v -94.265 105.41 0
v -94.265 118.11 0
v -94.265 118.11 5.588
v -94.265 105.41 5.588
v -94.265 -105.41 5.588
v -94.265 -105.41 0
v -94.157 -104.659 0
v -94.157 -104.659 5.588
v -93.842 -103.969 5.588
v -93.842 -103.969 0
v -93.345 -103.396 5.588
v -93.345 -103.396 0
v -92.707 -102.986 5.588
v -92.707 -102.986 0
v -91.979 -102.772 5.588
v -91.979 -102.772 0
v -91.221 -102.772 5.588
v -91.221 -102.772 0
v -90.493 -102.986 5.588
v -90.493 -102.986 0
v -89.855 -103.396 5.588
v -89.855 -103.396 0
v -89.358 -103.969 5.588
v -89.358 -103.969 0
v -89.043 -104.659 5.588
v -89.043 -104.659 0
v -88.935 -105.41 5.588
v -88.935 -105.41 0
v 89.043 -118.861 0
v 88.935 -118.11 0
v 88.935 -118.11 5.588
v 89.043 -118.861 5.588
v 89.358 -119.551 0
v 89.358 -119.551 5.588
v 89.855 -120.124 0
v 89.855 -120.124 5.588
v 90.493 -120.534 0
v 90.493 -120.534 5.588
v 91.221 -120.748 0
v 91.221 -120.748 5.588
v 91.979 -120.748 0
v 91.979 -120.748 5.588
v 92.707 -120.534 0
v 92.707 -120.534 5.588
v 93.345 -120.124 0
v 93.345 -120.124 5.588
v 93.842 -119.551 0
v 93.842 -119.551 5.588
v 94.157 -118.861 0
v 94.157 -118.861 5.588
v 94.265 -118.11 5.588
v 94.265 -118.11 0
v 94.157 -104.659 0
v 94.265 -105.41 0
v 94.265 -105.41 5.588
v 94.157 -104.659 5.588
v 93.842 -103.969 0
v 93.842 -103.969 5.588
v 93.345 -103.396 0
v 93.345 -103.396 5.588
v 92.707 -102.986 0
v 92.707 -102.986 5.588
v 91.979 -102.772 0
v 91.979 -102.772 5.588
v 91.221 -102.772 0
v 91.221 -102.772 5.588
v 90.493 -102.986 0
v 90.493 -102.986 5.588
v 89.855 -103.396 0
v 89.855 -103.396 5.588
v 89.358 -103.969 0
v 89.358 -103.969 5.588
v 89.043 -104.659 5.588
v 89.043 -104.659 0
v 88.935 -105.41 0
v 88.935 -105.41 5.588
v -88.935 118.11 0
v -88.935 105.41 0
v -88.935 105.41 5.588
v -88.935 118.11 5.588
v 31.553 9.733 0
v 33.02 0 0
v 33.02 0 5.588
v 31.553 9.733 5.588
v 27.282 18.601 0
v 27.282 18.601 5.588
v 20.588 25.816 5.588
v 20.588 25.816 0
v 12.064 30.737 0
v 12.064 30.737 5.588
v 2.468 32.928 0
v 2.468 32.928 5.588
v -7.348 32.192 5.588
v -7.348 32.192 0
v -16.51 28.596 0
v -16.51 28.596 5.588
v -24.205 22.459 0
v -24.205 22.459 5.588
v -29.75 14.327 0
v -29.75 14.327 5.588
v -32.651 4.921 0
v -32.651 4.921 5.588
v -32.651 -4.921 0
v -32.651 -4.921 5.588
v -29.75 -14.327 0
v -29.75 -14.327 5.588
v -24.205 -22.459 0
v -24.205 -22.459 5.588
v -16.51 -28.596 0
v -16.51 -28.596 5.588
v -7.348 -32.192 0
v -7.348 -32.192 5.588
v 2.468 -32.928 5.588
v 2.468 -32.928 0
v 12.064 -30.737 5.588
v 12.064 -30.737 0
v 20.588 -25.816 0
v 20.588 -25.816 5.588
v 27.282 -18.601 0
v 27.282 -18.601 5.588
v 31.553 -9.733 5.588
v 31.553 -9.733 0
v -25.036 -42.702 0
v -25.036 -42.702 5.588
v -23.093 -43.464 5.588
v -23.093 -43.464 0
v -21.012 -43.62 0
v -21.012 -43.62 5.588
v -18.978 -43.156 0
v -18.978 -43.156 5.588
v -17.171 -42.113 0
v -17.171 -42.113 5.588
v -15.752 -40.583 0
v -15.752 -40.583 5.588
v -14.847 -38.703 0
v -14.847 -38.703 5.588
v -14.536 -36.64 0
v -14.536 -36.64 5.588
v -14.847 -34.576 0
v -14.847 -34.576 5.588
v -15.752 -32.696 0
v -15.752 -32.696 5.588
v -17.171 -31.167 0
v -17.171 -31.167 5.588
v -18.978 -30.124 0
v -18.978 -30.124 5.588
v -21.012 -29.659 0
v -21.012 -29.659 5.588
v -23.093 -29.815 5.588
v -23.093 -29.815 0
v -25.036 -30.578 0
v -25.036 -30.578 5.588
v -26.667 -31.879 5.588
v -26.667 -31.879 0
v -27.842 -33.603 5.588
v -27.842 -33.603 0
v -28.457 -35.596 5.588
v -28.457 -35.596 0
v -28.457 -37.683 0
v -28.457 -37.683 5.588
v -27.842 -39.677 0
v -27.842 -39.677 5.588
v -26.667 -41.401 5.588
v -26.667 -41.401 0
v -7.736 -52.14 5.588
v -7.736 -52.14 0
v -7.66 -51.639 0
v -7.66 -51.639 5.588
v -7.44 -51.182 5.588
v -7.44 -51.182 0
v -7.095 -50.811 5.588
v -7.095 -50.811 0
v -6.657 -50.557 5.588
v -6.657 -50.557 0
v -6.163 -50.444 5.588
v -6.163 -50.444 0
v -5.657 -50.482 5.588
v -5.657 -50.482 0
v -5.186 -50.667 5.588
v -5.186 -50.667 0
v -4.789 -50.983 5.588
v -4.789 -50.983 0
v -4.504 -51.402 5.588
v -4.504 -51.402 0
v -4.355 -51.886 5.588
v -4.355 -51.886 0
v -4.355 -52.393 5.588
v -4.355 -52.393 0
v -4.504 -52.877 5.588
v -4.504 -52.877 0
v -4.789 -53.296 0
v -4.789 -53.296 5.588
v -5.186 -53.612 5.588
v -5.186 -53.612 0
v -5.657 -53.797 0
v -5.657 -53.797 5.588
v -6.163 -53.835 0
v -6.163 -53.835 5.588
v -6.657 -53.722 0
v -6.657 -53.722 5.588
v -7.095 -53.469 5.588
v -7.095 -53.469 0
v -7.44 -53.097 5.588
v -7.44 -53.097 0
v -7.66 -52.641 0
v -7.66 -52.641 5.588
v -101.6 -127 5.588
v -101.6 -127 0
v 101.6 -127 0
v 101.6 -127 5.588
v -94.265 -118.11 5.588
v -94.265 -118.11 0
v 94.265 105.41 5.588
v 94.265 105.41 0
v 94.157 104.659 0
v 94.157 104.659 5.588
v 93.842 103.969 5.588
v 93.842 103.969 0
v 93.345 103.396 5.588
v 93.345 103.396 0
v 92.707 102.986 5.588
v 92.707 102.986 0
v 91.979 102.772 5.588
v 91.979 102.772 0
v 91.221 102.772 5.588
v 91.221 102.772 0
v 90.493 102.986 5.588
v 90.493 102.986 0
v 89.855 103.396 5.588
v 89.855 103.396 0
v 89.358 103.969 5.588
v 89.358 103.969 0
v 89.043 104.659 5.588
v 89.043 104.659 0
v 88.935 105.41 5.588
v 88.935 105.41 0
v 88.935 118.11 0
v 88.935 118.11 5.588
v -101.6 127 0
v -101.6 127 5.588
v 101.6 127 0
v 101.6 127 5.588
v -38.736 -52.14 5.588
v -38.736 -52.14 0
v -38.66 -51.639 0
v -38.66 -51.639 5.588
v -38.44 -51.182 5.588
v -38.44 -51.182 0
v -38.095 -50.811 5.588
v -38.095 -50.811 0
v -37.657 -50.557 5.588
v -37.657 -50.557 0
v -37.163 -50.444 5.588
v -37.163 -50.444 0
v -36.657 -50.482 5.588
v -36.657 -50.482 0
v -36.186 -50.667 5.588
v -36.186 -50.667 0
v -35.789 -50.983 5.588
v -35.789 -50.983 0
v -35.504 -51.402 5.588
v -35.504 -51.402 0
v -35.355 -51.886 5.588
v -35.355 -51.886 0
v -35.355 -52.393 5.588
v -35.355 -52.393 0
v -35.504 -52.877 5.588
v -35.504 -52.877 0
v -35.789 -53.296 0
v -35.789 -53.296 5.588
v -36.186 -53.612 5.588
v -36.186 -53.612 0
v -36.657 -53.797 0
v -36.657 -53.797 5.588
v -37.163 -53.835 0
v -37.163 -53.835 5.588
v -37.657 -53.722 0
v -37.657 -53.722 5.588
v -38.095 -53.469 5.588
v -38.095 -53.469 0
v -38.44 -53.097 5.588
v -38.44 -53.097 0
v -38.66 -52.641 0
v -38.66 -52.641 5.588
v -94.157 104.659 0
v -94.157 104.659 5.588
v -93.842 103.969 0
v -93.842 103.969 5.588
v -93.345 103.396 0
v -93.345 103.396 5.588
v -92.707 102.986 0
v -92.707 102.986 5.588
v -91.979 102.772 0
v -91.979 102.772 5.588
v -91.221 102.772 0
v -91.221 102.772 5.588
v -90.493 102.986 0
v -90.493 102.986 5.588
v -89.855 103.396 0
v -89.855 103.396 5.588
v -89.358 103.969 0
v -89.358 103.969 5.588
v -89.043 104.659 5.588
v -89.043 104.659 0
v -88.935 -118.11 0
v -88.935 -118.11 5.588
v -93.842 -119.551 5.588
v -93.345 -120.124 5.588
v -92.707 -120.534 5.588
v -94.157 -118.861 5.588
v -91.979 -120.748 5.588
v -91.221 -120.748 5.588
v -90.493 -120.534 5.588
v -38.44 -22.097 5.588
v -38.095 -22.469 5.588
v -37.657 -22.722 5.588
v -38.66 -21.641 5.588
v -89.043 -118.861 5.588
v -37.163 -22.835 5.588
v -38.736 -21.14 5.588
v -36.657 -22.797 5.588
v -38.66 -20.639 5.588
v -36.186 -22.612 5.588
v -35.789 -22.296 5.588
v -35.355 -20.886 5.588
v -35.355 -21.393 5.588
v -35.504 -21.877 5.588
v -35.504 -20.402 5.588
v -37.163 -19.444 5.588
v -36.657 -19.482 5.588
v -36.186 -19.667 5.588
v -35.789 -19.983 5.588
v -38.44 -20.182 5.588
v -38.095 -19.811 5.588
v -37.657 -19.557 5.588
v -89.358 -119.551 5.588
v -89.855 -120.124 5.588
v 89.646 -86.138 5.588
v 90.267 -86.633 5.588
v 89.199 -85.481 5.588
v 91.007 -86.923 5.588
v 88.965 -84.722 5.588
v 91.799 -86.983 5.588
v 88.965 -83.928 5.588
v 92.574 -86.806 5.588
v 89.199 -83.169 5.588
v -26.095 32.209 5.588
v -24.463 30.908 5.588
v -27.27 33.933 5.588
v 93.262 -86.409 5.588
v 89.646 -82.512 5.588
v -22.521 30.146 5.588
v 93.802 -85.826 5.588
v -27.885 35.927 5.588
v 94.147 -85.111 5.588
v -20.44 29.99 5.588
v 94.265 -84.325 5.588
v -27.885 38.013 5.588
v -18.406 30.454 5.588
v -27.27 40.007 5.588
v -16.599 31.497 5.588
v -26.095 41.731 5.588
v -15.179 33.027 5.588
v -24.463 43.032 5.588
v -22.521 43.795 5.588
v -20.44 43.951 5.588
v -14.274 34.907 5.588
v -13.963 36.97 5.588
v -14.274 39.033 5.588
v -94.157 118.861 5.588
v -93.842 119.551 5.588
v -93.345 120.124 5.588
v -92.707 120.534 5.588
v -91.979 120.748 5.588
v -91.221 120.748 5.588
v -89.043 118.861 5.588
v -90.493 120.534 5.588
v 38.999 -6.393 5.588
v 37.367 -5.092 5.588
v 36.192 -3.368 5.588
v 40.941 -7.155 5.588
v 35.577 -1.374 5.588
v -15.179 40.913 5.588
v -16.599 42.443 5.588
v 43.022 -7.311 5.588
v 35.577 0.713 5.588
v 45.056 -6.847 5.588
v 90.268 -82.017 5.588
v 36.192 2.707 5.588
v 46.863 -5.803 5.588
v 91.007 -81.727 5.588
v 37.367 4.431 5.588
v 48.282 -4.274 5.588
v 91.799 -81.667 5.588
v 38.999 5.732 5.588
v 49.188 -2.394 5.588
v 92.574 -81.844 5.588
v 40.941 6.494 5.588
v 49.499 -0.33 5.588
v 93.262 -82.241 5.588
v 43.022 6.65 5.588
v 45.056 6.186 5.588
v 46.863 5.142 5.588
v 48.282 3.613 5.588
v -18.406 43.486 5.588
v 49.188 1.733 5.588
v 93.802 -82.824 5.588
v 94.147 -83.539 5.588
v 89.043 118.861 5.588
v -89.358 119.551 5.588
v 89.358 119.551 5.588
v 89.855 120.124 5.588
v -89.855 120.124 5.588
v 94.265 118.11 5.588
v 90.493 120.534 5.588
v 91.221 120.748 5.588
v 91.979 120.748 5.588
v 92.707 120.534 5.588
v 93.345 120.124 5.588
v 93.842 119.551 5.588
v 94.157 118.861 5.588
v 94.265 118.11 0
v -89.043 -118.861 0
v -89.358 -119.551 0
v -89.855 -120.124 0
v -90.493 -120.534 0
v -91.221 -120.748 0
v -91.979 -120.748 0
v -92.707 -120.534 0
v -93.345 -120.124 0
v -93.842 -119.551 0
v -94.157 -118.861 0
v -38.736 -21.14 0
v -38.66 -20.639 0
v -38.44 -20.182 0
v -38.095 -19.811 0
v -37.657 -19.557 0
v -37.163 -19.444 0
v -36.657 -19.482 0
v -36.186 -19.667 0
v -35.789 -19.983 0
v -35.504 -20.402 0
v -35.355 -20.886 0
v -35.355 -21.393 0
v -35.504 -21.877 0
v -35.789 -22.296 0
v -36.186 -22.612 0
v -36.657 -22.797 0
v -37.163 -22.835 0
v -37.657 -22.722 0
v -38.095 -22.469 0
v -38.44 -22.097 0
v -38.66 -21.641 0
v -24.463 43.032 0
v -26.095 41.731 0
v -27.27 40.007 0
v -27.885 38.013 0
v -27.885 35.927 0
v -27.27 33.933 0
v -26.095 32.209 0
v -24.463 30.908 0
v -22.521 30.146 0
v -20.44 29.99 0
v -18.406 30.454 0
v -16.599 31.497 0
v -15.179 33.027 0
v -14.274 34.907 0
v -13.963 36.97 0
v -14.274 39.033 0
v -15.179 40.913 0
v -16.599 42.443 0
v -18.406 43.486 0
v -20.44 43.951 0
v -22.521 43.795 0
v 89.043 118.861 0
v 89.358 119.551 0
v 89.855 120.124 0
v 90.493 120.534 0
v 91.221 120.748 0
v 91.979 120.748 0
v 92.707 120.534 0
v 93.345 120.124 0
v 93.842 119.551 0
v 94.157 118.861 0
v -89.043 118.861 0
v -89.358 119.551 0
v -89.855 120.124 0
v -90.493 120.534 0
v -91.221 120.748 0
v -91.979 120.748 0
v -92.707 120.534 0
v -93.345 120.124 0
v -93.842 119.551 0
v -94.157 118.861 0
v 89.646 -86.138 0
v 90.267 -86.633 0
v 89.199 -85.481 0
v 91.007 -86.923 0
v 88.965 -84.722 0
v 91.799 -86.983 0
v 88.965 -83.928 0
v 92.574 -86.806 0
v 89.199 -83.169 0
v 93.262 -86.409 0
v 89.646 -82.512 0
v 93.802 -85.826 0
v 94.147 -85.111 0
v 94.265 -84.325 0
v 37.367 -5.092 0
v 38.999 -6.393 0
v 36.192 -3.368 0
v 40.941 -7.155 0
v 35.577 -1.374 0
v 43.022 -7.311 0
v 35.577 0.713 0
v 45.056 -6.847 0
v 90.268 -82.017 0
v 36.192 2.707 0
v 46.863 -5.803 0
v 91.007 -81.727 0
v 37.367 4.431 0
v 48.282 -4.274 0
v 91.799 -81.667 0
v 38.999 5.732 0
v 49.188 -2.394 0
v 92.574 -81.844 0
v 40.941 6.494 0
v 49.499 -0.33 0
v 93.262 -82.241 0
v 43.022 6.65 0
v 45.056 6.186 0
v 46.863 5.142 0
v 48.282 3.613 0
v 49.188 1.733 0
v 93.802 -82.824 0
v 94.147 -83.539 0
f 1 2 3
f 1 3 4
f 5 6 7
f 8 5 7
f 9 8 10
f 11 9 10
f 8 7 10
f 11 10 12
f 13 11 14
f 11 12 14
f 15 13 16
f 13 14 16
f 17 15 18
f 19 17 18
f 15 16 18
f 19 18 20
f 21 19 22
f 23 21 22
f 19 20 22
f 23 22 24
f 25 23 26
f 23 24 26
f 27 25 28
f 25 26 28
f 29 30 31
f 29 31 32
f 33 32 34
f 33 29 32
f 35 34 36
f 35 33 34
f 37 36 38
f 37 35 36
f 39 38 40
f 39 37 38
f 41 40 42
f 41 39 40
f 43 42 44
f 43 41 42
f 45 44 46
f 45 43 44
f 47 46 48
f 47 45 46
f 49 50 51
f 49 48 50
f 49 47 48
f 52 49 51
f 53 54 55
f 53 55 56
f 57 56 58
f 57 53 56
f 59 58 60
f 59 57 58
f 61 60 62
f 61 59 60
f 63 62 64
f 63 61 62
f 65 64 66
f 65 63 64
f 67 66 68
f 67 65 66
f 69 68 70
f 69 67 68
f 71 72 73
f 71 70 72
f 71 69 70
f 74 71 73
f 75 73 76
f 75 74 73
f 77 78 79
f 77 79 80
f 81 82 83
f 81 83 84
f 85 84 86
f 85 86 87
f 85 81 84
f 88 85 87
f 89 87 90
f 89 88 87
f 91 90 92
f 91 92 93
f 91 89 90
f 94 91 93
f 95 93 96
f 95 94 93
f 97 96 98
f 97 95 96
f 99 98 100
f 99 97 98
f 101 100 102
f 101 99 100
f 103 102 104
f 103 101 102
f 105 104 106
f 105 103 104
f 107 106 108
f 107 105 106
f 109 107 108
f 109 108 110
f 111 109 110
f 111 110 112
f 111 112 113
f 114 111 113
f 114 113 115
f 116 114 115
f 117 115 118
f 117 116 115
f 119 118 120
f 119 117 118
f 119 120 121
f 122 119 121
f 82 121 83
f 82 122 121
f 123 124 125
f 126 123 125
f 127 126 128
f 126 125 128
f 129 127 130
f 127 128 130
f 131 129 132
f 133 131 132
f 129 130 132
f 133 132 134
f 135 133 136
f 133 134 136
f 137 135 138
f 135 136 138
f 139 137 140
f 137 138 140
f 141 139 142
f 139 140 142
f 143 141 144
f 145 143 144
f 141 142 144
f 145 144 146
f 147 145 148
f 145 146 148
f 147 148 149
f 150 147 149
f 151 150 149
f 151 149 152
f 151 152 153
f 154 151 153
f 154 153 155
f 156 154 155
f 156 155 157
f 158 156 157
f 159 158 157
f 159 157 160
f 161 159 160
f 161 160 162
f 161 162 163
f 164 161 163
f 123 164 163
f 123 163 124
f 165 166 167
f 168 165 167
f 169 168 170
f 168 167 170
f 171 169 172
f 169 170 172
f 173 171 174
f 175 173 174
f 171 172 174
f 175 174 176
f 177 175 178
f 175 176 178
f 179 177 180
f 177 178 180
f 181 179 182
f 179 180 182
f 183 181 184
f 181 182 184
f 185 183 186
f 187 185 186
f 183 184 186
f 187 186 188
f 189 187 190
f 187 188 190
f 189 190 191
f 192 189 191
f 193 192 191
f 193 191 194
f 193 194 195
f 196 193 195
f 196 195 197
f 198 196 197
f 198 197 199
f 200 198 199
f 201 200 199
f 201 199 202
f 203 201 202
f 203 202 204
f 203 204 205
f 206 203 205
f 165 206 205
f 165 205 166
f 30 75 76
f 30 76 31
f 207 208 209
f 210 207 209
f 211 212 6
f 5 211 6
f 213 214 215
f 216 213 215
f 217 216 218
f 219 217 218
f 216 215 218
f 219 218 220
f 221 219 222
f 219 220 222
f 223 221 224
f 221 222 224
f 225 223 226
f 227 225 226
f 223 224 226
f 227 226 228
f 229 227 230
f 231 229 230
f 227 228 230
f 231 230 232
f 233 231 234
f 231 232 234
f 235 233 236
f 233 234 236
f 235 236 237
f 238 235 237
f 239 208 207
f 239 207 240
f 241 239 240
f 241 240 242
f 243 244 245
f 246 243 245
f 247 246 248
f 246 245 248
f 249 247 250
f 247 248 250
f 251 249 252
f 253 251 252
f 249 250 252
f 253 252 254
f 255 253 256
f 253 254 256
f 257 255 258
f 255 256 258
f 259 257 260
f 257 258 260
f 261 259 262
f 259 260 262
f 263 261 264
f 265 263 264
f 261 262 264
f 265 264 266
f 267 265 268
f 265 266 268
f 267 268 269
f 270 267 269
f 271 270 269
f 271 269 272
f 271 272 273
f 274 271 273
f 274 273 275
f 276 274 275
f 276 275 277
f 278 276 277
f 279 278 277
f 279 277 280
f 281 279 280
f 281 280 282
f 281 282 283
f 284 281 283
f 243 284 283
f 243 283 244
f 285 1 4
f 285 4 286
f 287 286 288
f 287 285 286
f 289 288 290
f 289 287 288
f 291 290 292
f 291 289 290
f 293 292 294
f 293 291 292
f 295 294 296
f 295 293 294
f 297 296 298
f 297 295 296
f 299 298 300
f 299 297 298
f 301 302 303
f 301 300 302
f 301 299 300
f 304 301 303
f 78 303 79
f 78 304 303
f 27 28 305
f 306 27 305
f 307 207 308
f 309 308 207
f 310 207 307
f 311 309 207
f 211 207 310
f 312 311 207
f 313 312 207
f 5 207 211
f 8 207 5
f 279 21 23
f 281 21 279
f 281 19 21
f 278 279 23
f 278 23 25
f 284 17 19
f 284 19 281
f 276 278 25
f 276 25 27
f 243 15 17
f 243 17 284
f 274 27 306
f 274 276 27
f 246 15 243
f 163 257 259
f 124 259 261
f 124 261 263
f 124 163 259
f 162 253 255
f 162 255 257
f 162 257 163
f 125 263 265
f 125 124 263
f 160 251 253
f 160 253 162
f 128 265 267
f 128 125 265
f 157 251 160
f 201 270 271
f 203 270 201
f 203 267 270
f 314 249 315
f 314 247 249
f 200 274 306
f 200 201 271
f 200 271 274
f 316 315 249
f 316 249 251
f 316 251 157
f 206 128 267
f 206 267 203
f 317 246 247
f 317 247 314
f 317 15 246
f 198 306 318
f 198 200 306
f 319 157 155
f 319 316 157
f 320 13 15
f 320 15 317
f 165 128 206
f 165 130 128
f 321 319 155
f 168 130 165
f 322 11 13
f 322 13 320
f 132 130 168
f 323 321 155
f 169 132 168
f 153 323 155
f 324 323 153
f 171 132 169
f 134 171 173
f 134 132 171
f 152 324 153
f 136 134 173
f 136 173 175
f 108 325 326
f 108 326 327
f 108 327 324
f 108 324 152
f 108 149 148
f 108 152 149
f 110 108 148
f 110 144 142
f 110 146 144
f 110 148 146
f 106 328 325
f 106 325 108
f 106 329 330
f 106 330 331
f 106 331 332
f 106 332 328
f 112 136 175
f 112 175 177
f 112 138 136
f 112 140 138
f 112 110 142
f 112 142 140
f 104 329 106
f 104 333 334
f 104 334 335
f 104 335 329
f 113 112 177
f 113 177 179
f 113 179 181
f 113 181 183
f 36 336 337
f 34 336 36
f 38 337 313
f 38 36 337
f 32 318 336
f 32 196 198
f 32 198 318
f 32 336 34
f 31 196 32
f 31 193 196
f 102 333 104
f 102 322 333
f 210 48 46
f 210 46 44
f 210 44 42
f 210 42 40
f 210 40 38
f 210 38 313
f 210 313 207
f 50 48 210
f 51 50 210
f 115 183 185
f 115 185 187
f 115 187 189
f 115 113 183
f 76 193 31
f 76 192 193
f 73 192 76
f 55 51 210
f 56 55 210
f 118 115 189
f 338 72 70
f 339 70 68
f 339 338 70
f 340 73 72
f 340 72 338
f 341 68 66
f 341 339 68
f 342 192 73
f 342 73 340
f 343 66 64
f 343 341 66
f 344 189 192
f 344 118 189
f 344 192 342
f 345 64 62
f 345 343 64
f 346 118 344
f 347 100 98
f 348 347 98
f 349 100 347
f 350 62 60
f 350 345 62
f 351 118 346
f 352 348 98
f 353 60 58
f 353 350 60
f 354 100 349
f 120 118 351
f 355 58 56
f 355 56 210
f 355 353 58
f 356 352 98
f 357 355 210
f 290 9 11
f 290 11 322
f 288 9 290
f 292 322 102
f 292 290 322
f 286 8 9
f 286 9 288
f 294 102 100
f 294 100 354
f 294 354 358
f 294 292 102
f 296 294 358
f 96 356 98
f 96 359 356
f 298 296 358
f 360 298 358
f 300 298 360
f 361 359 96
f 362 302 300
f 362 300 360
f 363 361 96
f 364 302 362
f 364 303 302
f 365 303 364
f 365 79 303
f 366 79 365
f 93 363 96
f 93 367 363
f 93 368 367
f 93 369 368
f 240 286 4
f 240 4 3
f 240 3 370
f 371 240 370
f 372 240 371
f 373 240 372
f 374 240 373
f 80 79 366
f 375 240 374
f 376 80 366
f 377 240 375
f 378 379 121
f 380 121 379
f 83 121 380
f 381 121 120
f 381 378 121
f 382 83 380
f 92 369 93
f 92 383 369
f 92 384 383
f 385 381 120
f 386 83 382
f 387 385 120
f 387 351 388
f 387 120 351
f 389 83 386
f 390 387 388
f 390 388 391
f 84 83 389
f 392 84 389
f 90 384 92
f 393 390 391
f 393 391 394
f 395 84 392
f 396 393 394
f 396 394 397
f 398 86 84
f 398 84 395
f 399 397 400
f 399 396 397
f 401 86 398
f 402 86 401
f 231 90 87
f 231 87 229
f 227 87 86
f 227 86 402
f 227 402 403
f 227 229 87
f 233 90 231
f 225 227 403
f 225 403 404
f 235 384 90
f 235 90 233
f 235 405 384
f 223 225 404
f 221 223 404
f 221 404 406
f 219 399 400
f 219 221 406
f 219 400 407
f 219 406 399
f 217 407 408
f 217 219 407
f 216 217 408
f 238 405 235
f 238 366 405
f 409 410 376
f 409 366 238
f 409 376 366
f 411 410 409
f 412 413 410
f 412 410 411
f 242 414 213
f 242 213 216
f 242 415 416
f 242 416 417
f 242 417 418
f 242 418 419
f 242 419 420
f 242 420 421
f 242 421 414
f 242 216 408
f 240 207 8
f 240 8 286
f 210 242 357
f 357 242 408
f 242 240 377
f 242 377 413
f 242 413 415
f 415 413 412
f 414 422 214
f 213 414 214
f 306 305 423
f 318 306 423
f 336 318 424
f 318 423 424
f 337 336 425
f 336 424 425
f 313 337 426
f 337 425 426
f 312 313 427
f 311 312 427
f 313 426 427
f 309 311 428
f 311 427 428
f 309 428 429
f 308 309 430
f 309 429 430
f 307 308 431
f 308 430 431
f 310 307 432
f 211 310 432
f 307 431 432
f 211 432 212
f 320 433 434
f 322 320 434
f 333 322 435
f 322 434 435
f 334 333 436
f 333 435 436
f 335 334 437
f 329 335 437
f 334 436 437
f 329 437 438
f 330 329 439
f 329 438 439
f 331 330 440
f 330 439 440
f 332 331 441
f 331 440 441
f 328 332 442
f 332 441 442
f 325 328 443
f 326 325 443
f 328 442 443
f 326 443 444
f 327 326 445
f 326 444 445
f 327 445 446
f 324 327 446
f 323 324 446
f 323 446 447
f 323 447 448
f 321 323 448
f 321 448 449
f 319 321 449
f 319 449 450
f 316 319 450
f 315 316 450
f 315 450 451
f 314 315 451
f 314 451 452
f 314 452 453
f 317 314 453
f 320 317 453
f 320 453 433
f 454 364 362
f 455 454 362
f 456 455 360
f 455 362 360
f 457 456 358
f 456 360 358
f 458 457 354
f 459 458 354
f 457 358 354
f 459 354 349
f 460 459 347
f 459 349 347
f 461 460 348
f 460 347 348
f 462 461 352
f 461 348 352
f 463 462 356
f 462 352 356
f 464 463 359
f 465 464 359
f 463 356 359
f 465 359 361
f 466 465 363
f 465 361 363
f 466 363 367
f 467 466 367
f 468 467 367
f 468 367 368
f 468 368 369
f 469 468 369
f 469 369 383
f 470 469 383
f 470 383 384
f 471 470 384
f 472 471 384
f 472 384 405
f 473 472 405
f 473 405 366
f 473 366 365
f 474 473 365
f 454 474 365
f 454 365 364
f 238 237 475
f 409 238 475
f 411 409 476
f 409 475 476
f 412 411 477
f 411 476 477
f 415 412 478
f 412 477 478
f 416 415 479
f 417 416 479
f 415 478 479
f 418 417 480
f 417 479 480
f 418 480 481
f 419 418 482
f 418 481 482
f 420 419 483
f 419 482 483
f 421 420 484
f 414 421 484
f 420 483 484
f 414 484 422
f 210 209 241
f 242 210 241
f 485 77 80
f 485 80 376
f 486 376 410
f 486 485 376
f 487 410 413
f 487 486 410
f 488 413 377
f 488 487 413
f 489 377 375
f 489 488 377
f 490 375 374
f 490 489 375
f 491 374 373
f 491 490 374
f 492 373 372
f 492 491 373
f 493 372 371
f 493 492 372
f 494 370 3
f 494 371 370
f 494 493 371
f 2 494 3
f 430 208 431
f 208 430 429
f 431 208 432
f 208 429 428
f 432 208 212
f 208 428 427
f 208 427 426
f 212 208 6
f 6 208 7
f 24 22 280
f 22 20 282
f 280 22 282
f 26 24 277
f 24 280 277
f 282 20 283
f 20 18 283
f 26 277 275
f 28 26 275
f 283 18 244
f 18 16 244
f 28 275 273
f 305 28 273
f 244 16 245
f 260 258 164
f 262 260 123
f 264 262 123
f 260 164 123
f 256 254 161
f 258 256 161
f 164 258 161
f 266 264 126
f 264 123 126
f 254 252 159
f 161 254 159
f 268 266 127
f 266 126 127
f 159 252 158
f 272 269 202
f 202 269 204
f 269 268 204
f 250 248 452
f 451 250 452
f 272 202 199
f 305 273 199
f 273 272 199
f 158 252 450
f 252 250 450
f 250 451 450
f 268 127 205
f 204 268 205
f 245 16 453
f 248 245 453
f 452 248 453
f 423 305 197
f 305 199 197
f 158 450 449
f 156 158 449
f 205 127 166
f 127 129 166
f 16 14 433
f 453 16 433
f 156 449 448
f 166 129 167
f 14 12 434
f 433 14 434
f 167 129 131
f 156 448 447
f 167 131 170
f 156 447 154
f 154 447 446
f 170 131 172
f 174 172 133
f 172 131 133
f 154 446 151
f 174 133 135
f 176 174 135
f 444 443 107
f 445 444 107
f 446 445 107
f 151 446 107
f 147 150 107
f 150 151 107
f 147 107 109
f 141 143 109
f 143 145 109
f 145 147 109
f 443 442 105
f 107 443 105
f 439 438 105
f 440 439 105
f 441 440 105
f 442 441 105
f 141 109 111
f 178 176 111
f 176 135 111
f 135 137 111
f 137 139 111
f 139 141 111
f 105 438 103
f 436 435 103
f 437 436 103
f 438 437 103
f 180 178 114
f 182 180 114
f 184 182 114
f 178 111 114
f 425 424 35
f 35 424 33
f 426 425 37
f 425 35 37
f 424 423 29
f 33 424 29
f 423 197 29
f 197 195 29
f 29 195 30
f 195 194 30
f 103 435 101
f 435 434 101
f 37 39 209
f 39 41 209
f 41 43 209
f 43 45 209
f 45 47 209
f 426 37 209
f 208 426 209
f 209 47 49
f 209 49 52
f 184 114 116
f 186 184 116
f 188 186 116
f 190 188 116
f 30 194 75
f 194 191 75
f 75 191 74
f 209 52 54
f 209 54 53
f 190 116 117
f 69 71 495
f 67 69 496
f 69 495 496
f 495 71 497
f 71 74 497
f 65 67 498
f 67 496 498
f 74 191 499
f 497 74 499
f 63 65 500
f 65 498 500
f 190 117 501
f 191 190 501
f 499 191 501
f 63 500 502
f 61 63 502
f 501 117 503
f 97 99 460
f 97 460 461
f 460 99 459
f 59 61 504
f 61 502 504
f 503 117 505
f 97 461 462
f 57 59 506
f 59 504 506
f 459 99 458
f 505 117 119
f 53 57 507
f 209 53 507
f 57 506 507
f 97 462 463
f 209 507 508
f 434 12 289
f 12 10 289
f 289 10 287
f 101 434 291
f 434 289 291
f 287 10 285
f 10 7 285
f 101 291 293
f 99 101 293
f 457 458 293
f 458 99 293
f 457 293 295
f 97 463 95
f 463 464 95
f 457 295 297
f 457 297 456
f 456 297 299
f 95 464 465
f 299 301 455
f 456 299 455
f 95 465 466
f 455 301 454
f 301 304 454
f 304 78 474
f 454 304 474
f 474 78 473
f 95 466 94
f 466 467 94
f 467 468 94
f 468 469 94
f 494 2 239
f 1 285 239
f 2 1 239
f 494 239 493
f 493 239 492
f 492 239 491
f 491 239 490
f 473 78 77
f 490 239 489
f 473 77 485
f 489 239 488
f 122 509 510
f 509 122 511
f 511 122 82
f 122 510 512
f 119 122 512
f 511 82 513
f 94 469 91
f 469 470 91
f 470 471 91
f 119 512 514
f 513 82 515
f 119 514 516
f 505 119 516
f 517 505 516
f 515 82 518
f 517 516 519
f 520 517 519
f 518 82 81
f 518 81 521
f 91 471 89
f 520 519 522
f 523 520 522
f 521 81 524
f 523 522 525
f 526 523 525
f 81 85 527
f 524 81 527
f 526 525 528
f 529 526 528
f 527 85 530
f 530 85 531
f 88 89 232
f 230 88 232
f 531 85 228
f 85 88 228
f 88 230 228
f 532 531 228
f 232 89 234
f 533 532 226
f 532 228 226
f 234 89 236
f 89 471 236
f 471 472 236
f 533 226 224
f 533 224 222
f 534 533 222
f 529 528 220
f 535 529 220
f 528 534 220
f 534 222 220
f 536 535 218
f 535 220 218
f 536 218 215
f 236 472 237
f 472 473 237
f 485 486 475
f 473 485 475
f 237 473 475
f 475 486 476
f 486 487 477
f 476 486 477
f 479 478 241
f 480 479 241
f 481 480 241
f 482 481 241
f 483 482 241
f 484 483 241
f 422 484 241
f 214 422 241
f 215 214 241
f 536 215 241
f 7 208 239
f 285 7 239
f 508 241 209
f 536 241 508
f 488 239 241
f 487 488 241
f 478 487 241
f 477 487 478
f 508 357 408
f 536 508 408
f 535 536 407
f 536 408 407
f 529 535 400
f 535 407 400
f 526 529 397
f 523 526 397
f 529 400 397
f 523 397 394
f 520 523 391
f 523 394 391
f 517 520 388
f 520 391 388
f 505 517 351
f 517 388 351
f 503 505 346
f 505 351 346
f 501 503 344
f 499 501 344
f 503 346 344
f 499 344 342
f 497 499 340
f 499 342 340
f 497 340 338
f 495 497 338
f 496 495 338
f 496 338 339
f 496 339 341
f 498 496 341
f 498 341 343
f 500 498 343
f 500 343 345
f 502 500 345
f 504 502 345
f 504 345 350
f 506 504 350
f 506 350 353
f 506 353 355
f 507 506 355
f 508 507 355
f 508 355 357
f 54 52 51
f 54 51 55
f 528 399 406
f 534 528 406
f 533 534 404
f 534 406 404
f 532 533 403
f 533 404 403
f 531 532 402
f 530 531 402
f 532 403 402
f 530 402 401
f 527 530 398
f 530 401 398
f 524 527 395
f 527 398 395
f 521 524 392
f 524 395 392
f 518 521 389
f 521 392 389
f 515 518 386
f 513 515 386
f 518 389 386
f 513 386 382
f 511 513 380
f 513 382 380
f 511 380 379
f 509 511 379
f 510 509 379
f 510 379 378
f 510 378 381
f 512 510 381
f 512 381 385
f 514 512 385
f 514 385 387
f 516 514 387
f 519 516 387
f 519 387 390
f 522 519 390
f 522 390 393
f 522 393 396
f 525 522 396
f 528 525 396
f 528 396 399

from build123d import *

# Parameters (mm, degrees)
SKETCH1_W                                = 203.2
SKETCH1_H                                = 254
SKETCH1_R                                = 33.02
BOSS_EXTRUDE1_DEPTH                      = 5.588
SKETCH7_R                                = 7
CUT_EXTRUDE6_DEPTH                       = 10
CIRPATTERN2_COUNT                        = 3
SKETCH9_R                                = 1.7
CUT_EXTRUDE8_DEPTH                       = 163.735324205
SKETCH10_R                               = 2.665
CUT_EXTRUDE9_DEPTH                       = 498.241984141
CUT_EXTRUDE10_DEPTH                      = 163.735324205
MIRROR1_AT_THE_SECOND_PLANE_COPY_1_DEPTH = 163.735324205


with BuildPart() as part:
    # Sketch1 → Boss-Extrude1 (new body)
    with BuildSketch(Plane.XY):
        Rectangle(SKETCH1_W, SKETCH1_H)
        Circle(SKETCH1_R, mode=Mode.SUBTRACT)
    extrude(amount=BOSS_EXTRUDE1_DEPTH)

    # Sketch7 → Cut-Extrude6 (cut)
    with BuildSketch(Plane(origin=(-207.785981093, -42.996428153, 5.588), x_dir=(0.9999282090774324, -0.011982349151927488, 0), z_dir=(0, 0, 1))):
        with Locations(Location((249.755489637, 45.661901138, 0), (0, 0, 0.686554465))):
            Circle(SKETCH7_R)
    cut_extrude6 = extrude(amount=-CUT_EXTRUDE6_DEPTH, mode=Mode.SUBTRACT)

    # CirPattern2: Cut-Extrude6 ×3 about axis
    cirpattern2_axis = Axis((0, 0, 0), (0, 0, 1))
    for i in range(1, CIRPATTERN2_COUNT):
        add(cut_extrude6.rotate(cirpattern2_axis, i * 360 / CIRPATTERN2_COUNT), mode=Mode.SUBTRACT)

    # Sketch9 → Cut-Extrude8 (cut, through all)
    with BuildSketch(Plane(origin=(0, 0, 0), x_dir=(-1, 0, 0), z_dir=(0, 0, -1))):
        with Locations((37.035546616, -21.139735697)):
            Circle(SKETCH9_R)
        with Locations((37.035546616, -52.139735697)):
            Circle(SKETCH9_R)
        with Locations((6.035546616, -52.139735697)):
            Circle(SKETCH9_R)
    extrude(amount=-CUT_EXTRUDE8_DEPTH, mode=Mode.SUBTRACT)

    # Sketch10 → Cut-Extrude9 (cut, through all)
    with BuildSketch(Plane(origin=(-338.26084164, -104.82063118, 5.588), x_dir=(0.9999190535665993, -0.012723455288419916, 0), z_dir=(0, 0, 1))):
        with Locations(Location((429.565270691, 25.963287337, 0), (0, 0, 0.729019959))):
            Circle(SKETCH10_R)
    extrude(amount=-CUT_EXTRUDE9_DEPTH, mode=Mode.SUBTRACT)

    # Sketch11 → Cut-Extrude10 (cut, through all)
    with BuildSketch(Plane(origin=(0, 0, 0), x_dir=(-1, 0, 0), z_dir=(0, 0, -1))):
        with BuildLine():
            Line((-94.265, -118.11), (-94.265, -105.41))
            ThreePointArc((-94.265, -105.41), (-91.6, -102.745), (-88.935, -105.41))
            Line((-88.935, -105.41), (-88.935, -118.11))
            ThreePointArc((-88.935, -118.11), (-91.6, -120.775), (-94.265, -118.11))
        make_face()
    cut_extrude10 = extrude(amount=-CUT_EXTRUDE10_DEPTH, mode=Mode.SUBTRACT)

    # Mirror1: Cut-Extrude10 across plane
    add(cut_extrude10.mirror(Plane(origin=(0, 0, 0), x_dir=(0, 0, 1), z_dir=(1, 0, 0))), mode=Mode.SUBTRACT)

    # Mirror1 at the second plane: Cut-Extrude10 across plane
    add(cut_extrude10.mirror(Plane.ZX), mode=Mode.SUBTRACT)

    # Mirror1 at the second plane copy 1 sketc → Mirror1 at the second plane copy 1 (cut, through all)
    with BuildSketch(Plane(origin=(0, 0, 0), x_dir=(1, 0, 0), z_dir=(0, 0, -1))):
        with BuildLine():
            Line((-94.265, -118.11), (-94.265, -105.41))
            ThreePointArc((-94.265, -105.41), (-91.6, -102.745), (-88.935, -105.41))
            Line((-88.935, -105.41), (-88.935, -118.11))
            ThreePointArc((-88.935, -118.11), (-91.6, -120.775), (-94.265, -118.11))
        make_face()
    extrude(amount=-MIRROR1_AT_THE_SECOND_PLANE_COPY_1_DEPTH, mode=Mode.SUBTRACT)


solid = part.part
